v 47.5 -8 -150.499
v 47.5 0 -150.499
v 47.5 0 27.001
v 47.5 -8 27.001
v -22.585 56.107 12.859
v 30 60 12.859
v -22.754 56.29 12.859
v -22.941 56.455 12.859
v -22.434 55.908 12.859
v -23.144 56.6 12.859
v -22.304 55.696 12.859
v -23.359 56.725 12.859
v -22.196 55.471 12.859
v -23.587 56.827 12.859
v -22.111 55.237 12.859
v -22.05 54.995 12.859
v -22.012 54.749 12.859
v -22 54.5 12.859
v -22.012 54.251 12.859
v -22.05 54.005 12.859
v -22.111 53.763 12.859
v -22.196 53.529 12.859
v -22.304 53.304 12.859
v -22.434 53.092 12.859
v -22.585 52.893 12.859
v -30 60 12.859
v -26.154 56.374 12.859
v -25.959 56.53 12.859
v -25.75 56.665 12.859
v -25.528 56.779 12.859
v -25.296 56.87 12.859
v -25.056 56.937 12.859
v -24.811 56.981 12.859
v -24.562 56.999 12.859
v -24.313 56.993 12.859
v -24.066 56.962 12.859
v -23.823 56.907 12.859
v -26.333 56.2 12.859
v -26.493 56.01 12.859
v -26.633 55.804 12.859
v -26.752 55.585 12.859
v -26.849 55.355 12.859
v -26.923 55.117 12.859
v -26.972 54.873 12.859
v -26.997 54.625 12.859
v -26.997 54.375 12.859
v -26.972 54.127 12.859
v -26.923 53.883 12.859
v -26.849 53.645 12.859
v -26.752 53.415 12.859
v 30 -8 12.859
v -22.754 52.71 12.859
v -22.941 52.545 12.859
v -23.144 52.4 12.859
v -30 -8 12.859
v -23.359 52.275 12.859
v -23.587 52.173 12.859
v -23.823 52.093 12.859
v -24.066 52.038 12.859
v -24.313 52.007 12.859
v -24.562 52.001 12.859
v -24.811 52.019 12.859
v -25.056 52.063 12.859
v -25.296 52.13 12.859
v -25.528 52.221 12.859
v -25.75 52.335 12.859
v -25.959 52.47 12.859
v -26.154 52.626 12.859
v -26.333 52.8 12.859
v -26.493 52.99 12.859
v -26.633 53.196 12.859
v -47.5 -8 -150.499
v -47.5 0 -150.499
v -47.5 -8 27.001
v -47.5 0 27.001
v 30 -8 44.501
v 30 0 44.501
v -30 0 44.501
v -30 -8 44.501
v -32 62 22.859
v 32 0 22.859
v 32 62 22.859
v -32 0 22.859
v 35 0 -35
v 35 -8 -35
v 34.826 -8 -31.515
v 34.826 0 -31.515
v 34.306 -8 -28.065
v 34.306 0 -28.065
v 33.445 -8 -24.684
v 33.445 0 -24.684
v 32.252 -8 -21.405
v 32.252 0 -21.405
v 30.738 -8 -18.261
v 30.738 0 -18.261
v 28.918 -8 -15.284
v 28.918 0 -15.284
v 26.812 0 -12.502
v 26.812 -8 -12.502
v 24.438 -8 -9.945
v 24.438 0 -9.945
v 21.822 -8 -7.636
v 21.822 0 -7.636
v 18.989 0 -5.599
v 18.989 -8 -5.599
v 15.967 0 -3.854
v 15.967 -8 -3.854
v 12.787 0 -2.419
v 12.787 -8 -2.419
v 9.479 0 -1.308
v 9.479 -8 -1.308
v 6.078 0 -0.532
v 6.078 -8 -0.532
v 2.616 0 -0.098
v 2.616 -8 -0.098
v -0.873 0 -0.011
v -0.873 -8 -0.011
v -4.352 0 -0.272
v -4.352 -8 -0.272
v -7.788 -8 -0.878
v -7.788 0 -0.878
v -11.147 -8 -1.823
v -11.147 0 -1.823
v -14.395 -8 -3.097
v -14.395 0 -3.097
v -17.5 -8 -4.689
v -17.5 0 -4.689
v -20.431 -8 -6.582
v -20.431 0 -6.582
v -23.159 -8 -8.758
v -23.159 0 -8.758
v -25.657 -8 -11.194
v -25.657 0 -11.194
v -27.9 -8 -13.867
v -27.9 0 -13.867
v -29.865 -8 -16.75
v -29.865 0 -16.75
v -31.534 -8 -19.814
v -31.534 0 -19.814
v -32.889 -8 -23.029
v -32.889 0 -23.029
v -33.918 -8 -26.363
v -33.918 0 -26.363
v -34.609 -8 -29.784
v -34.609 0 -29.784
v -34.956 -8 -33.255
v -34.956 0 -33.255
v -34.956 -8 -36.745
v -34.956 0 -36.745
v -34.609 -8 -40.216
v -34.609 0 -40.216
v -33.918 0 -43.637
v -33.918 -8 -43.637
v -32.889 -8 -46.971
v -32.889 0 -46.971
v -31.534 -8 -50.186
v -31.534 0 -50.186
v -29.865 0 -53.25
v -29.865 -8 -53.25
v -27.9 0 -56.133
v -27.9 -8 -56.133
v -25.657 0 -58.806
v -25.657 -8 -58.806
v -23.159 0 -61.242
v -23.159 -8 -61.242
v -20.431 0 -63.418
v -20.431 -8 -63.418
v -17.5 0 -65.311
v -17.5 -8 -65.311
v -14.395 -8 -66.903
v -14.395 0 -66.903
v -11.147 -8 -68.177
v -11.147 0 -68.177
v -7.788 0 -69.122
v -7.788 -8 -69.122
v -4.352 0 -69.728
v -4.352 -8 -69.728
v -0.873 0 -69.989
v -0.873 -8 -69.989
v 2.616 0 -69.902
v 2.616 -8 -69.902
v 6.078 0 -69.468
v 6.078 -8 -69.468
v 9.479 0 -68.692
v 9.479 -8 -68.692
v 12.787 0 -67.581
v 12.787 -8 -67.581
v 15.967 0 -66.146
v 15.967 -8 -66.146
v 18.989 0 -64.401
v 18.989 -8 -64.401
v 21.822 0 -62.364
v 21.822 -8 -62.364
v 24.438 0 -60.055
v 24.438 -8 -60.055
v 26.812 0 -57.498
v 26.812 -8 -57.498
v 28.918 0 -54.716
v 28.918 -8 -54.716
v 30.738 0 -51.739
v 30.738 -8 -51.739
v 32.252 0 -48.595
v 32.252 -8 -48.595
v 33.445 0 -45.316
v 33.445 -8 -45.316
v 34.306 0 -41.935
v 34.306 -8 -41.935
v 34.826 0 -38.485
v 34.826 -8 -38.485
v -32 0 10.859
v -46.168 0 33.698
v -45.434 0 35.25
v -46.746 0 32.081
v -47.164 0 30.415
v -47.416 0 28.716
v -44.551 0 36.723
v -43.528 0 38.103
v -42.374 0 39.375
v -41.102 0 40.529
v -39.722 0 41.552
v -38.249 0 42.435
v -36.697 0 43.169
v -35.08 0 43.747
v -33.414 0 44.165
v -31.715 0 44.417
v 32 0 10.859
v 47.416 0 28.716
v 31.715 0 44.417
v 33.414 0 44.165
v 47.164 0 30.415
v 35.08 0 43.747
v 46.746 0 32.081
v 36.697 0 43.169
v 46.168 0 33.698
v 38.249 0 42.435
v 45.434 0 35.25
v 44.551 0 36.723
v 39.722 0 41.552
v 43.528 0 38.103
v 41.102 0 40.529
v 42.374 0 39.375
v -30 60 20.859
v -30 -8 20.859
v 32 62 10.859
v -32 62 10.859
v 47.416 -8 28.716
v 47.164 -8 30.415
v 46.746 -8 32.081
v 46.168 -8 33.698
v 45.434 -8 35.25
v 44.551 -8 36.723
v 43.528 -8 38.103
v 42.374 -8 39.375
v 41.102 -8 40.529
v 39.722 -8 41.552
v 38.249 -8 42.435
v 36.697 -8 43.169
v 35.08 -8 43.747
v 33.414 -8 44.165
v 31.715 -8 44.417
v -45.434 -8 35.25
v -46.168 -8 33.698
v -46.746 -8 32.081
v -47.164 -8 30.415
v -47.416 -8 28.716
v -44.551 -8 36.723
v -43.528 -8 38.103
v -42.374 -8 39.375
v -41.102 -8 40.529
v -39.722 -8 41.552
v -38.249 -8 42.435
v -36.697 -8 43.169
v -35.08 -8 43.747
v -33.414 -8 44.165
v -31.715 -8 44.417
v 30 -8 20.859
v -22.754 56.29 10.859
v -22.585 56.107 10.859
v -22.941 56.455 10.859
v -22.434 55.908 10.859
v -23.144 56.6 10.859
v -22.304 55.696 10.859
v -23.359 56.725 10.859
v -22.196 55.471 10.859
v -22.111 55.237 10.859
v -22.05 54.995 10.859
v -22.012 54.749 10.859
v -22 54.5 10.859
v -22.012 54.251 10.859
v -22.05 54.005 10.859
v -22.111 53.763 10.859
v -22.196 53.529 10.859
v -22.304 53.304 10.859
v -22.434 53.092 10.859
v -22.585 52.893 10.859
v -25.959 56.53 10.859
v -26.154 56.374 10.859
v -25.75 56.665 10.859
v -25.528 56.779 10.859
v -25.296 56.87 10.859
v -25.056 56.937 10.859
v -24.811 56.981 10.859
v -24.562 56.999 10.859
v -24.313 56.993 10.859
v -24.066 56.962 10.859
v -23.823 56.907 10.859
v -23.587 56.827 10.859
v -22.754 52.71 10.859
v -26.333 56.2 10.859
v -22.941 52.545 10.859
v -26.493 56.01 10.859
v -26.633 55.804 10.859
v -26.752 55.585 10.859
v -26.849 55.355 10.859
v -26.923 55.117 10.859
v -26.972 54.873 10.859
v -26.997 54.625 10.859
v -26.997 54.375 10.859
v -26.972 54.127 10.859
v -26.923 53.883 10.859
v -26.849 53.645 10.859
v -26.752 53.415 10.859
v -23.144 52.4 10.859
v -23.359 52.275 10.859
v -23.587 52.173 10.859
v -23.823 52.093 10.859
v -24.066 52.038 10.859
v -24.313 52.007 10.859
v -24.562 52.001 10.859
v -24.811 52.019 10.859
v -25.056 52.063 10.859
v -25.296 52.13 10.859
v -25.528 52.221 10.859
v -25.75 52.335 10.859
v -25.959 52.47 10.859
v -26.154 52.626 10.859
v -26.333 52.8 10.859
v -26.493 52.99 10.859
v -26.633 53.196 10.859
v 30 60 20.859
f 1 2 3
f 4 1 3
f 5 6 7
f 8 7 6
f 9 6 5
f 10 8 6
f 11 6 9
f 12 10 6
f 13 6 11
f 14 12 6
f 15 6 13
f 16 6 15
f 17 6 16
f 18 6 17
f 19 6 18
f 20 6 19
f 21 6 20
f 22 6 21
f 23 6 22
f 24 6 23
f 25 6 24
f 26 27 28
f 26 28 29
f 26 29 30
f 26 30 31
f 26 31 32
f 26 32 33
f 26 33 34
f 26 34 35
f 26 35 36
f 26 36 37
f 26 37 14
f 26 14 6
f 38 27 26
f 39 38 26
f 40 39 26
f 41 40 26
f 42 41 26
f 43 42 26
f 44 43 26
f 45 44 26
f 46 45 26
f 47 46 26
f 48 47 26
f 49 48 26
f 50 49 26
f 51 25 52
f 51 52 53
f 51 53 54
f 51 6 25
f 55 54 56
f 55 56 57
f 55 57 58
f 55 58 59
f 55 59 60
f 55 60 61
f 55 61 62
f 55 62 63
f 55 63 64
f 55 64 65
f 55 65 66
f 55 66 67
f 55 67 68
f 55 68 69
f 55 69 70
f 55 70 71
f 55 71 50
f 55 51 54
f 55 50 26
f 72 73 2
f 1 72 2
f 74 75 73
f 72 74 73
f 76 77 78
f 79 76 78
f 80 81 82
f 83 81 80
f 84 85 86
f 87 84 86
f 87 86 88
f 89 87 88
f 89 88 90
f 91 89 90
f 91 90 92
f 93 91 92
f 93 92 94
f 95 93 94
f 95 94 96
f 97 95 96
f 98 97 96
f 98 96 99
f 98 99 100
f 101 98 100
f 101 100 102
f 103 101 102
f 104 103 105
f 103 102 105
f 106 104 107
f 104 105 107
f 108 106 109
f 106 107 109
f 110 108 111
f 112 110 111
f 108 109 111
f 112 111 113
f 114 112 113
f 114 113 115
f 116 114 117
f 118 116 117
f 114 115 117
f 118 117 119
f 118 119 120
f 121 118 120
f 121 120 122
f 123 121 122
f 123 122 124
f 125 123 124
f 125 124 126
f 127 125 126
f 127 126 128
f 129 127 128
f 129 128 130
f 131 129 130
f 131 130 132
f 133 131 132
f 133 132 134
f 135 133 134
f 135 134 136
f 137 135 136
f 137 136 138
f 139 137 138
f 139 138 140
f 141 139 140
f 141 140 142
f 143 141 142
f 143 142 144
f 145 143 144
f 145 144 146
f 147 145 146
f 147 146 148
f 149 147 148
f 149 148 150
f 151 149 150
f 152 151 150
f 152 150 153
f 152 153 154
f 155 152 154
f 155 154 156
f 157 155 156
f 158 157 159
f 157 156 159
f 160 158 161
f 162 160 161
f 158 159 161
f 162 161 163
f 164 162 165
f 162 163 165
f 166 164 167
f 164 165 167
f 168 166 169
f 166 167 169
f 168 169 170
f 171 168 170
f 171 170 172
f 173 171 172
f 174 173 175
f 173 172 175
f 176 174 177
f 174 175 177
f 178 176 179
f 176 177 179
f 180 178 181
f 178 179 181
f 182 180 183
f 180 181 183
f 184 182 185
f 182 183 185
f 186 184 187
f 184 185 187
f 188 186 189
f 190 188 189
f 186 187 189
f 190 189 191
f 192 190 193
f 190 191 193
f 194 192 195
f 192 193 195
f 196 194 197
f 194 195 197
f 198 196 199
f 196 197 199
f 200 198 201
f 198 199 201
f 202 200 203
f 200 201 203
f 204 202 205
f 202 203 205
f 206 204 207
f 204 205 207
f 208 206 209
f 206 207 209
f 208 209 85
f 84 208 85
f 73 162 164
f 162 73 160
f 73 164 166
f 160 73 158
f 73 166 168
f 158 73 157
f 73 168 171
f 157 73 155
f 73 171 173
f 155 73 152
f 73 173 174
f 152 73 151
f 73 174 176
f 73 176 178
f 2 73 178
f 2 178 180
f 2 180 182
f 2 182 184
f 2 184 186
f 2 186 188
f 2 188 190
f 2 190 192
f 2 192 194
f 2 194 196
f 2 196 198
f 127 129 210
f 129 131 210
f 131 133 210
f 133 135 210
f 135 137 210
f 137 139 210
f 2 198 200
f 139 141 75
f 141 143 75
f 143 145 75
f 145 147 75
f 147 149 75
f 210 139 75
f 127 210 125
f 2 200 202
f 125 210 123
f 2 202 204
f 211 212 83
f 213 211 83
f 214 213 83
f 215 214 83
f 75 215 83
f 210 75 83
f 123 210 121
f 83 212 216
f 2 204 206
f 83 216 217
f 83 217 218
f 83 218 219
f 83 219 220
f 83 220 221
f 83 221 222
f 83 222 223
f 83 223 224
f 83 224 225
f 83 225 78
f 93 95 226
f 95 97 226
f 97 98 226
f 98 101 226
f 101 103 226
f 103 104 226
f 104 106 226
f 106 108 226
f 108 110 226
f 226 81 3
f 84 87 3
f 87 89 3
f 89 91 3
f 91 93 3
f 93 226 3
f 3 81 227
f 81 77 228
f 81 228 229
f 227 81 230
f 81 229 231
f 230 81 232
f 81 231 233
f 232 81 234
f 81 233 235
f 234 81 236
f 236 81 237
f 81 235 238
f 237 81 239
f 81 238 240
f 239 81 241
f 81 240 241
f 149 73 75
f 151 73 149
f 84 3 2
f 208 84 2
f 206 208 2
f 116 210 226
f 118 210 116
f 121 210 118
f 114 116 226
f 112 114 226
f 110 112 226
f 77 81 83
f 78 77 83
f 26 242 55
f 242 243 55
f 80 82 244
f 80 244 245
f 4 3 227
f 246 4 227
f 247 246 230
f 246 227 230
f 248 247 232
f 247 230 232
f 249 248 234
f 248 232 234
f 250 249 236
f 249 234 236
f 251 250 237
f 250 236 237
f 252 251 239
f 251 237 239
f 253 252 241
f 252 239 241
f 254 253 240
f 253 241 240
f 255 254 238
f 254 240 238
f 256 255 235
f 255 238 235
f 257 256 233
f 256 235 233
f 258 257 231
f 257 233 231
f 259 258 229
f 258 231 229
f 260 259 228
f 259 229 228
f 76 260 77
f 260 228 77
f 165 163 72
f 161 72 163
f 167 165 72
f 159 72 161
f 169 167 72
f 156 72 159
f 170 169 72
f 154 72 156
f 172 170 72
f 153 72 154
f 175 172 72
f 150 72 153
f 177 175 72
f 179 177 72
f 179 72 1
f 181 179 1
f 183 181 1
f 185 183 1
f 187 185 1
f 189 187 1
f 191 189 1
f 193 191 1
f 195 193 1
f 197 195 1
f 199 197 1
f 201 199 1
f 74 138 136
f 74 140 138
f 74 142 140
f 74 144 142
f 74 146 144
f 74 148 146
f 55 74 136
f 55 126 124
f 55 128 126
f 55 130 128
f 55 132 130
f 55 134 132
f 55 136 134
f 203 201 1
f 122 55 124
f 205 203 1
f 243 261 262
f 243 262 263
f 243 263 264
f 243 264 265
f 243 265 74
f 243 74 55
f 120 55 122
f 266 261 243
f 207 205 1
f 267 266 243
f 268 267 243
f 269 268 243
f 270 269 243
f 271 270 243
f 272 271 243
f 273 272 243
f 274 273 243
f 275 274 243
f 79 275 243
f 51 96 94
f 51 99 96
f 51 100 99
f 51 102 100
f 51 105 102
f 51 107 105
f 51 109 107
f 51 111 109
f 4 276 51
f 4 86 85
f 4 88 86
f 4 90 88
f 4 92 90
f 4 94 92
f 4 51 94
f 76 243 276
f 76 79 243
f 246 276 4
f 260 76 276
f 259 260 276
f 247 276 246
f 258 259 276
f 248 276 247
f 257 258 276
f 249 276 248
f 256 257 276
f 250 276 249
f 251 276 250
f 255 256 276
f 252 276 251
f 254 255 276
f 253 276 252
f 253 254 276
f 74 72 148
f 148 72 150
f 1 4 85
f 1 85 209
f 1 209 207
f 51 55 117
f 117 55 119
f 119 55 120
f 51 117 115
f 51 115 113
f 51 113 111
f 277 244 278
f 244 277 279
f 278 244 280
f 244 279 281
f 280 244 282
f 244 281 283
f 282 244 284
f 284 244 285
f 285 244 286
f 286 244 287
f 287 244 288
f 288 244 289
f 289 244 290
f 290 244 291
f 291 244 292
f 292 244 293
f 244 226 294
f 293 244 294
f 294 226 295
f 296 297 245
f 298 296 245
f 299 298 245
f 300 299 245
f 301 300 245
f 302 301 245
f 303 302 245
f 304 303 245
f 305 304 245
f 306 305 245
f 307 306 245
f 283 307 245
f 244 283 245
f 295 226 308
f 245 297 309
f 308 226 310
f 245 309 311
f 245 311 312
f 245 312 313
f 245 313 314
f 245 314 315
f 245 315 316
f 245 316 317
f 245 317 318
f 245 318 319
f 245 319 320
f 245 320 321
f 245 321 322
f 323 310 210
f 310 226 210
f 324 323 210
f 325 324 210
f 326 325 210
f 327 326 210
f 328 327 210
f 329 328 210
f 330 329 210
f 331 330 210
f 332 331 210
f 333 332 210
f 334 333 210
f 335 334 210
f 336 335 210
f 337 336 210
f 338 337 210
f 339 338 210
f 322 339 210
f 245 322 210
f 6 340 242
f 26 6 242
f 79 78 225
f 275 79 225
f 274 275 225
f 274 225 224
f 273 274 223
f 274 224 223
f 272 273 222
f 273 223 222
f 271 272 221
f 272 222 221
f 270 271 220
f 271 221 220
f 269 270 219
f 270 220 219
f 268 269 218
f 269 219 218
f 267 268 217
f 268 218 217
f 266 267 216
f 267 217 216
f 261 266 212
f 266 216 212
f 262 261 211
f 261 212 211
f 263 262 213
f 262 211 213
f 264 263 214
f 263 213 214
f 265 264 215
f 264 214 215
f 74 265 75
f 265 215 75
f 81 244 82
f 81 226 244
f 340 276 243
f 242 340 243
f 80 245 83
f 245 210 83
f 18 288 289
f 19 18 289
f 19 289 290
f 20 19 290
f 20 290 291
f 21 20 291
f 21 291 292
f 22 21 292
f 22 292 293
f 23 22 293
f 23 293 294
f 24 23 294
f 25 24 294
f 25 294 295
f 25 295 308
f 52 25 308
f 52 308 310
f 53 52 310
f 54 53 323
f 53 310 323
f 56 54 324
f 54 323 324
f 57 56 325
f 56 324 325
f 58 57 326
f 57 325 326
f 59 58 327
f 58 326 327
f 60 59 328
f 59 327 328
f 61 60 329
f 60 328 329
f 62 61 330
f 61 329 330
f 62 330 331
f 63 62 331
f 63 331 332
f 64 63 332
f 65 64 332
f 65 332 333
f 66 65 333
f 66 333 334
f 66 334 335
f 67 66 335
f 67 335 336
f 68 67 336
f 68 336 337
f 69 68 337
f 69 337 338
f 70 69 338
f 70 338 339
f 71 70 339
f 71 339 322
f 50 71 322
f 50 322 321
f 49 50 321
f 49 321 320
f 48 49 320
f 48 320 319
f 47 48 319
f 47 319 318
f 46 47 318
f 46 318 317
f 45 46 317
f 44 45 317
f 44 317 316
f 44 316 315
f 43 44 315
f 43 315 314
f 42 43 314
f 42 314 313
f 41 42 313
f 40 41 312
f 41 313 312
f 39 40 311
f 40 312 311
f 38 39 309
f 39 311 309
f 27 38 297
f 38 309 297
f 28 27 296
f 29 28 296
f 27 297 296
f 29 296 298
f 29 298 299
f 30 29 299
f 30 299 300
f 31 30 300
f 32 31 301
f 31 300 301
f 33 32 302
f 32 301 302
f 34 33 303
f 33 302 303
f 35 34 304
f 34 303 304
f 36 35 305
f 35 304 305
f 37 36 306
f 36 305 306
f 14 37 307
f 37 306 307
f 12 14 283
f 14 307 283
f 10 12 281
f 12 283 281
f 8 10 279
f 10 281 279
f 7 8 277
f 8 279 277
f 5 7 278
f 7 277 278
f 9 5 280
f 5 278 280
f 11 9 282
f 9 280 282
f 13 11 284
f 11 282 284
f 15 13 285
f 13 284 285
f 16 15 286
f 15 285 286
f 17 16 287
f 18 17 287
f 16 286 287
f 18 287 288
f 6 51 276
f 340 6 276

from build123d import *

# Parameters (mm, degrees)
F1_DEPTH  = 8
F2_R      = 35
F3_DEPTH  = 10
F4_W      = 30
F4_H      = 8
F5_DEPTH  = 8
F6_W      = 60
F6_H      = 2
F7_DEPTH  = 60
F8_W      = 64
F8_H      = 12
F9_DEPTH  = 2
F10_R     = 2.5
F11_DEPTH = 4


# Not quite as in the source:
# - the program builds the solid bodies; features that only make, move or delete a surface that nothing else refers to are left out


with BuildPart() as f1:
    # F0 (on Front) → F1 (new body)
    with BuildSketch(Plane.XZ):
        with BuildLine():
            Line((30, 44.5009035608), (-30, 44.5009035608))
            ThreePointArc((-30, 44.5009035608), (-42.3743686708, 39.3752722315), (-47.5, 27.0009035608))
            Line((-47.5, 27.0009035608), (-47.5, -150.4990964392))
            Line((-47.5, -150.4990964392), (47.5, -150.4990964392))
            Line((47.5, -150.4990964392), (47.5, 27.0009035608))
            ThreePointArc((47.5, 27.0009035608), (42.3743686708, 39.3752722315), (30, 44.5009035608))
        make_face()
    extrude(amount=F1_DEPTH)

    # F2 (on face) → F3 (cut)
    with BuildSketch(Plane.XZ.offset(8)):
        with Locations((0, -35)):
            Circle(F2_R)
    extrude(amount=-F3_DEPTH, mode=Mode.SUBTRACT)

    # F4 (on face) → F5 (cut)
    with BuildSketch(Plane.XZ.offset(8)):
        with Locations((-15, 16.8591848421)):
            Rectangle(F4_W, F4_H)
        with Locations((15, 16.8591848421)):
            Rectangle(F4_W, F4_H)
    extrude(amount=-F5_DEPTH, mode=Mode.SUBTRACT)

    # F6 (on face) → F7 (join)
    with BuildSketch(Plane(origin=(0, 0, 0), x_dir=(-1, 0, 0), z_dir=(0, 1, 0))):
        with Locations((0, 21.8591848421)):
            Rectangle(F6_W, F6_H)
        Polygon((-30, 12.8591848421), (-30, 20.8591848421), (-30, 22.8591848421), (-32, 22.8591848421), (-32, 10.8591848421), (-30, 10.8591848421), align=None)
        Polygon((30, 22.8591848421), (30, 20.8591848421), (30, 12.8591848421), (30, 10.8591848421), (32, 10.8591848421), (32, 22.8591848421), align=None)
        with Locations((0, 11.8591848421)):
            Rectangle(F6_W, F6_H)
    extrude(amount=F7_DEPTH)

    # F8 (on face) → F9 (join)
    with BuildSketch(Plane(origin=(0, 60, 0), x_dir=(-1, 0, 0), z_dir=(0, 1, 0))):
        with Locations((0, 16.8591848421)):
            Rectangle(F8_W, F8_H)
    extrude(amount=F9_DEPTH)

    # F10 (on face) → F11 (cut)
    with BuildSketch(Plane(origin=(0, 0, 10.8591848421), x_dir=(1, 0, 0), z_dir=(0, 0, -1))):
        with Locations((-24.5, -54.5)):
            Circle(F10_R)
    extrude(amount=-F11_DEPTH, mode=Mode.SUBTRACT)


solid = f1.part
